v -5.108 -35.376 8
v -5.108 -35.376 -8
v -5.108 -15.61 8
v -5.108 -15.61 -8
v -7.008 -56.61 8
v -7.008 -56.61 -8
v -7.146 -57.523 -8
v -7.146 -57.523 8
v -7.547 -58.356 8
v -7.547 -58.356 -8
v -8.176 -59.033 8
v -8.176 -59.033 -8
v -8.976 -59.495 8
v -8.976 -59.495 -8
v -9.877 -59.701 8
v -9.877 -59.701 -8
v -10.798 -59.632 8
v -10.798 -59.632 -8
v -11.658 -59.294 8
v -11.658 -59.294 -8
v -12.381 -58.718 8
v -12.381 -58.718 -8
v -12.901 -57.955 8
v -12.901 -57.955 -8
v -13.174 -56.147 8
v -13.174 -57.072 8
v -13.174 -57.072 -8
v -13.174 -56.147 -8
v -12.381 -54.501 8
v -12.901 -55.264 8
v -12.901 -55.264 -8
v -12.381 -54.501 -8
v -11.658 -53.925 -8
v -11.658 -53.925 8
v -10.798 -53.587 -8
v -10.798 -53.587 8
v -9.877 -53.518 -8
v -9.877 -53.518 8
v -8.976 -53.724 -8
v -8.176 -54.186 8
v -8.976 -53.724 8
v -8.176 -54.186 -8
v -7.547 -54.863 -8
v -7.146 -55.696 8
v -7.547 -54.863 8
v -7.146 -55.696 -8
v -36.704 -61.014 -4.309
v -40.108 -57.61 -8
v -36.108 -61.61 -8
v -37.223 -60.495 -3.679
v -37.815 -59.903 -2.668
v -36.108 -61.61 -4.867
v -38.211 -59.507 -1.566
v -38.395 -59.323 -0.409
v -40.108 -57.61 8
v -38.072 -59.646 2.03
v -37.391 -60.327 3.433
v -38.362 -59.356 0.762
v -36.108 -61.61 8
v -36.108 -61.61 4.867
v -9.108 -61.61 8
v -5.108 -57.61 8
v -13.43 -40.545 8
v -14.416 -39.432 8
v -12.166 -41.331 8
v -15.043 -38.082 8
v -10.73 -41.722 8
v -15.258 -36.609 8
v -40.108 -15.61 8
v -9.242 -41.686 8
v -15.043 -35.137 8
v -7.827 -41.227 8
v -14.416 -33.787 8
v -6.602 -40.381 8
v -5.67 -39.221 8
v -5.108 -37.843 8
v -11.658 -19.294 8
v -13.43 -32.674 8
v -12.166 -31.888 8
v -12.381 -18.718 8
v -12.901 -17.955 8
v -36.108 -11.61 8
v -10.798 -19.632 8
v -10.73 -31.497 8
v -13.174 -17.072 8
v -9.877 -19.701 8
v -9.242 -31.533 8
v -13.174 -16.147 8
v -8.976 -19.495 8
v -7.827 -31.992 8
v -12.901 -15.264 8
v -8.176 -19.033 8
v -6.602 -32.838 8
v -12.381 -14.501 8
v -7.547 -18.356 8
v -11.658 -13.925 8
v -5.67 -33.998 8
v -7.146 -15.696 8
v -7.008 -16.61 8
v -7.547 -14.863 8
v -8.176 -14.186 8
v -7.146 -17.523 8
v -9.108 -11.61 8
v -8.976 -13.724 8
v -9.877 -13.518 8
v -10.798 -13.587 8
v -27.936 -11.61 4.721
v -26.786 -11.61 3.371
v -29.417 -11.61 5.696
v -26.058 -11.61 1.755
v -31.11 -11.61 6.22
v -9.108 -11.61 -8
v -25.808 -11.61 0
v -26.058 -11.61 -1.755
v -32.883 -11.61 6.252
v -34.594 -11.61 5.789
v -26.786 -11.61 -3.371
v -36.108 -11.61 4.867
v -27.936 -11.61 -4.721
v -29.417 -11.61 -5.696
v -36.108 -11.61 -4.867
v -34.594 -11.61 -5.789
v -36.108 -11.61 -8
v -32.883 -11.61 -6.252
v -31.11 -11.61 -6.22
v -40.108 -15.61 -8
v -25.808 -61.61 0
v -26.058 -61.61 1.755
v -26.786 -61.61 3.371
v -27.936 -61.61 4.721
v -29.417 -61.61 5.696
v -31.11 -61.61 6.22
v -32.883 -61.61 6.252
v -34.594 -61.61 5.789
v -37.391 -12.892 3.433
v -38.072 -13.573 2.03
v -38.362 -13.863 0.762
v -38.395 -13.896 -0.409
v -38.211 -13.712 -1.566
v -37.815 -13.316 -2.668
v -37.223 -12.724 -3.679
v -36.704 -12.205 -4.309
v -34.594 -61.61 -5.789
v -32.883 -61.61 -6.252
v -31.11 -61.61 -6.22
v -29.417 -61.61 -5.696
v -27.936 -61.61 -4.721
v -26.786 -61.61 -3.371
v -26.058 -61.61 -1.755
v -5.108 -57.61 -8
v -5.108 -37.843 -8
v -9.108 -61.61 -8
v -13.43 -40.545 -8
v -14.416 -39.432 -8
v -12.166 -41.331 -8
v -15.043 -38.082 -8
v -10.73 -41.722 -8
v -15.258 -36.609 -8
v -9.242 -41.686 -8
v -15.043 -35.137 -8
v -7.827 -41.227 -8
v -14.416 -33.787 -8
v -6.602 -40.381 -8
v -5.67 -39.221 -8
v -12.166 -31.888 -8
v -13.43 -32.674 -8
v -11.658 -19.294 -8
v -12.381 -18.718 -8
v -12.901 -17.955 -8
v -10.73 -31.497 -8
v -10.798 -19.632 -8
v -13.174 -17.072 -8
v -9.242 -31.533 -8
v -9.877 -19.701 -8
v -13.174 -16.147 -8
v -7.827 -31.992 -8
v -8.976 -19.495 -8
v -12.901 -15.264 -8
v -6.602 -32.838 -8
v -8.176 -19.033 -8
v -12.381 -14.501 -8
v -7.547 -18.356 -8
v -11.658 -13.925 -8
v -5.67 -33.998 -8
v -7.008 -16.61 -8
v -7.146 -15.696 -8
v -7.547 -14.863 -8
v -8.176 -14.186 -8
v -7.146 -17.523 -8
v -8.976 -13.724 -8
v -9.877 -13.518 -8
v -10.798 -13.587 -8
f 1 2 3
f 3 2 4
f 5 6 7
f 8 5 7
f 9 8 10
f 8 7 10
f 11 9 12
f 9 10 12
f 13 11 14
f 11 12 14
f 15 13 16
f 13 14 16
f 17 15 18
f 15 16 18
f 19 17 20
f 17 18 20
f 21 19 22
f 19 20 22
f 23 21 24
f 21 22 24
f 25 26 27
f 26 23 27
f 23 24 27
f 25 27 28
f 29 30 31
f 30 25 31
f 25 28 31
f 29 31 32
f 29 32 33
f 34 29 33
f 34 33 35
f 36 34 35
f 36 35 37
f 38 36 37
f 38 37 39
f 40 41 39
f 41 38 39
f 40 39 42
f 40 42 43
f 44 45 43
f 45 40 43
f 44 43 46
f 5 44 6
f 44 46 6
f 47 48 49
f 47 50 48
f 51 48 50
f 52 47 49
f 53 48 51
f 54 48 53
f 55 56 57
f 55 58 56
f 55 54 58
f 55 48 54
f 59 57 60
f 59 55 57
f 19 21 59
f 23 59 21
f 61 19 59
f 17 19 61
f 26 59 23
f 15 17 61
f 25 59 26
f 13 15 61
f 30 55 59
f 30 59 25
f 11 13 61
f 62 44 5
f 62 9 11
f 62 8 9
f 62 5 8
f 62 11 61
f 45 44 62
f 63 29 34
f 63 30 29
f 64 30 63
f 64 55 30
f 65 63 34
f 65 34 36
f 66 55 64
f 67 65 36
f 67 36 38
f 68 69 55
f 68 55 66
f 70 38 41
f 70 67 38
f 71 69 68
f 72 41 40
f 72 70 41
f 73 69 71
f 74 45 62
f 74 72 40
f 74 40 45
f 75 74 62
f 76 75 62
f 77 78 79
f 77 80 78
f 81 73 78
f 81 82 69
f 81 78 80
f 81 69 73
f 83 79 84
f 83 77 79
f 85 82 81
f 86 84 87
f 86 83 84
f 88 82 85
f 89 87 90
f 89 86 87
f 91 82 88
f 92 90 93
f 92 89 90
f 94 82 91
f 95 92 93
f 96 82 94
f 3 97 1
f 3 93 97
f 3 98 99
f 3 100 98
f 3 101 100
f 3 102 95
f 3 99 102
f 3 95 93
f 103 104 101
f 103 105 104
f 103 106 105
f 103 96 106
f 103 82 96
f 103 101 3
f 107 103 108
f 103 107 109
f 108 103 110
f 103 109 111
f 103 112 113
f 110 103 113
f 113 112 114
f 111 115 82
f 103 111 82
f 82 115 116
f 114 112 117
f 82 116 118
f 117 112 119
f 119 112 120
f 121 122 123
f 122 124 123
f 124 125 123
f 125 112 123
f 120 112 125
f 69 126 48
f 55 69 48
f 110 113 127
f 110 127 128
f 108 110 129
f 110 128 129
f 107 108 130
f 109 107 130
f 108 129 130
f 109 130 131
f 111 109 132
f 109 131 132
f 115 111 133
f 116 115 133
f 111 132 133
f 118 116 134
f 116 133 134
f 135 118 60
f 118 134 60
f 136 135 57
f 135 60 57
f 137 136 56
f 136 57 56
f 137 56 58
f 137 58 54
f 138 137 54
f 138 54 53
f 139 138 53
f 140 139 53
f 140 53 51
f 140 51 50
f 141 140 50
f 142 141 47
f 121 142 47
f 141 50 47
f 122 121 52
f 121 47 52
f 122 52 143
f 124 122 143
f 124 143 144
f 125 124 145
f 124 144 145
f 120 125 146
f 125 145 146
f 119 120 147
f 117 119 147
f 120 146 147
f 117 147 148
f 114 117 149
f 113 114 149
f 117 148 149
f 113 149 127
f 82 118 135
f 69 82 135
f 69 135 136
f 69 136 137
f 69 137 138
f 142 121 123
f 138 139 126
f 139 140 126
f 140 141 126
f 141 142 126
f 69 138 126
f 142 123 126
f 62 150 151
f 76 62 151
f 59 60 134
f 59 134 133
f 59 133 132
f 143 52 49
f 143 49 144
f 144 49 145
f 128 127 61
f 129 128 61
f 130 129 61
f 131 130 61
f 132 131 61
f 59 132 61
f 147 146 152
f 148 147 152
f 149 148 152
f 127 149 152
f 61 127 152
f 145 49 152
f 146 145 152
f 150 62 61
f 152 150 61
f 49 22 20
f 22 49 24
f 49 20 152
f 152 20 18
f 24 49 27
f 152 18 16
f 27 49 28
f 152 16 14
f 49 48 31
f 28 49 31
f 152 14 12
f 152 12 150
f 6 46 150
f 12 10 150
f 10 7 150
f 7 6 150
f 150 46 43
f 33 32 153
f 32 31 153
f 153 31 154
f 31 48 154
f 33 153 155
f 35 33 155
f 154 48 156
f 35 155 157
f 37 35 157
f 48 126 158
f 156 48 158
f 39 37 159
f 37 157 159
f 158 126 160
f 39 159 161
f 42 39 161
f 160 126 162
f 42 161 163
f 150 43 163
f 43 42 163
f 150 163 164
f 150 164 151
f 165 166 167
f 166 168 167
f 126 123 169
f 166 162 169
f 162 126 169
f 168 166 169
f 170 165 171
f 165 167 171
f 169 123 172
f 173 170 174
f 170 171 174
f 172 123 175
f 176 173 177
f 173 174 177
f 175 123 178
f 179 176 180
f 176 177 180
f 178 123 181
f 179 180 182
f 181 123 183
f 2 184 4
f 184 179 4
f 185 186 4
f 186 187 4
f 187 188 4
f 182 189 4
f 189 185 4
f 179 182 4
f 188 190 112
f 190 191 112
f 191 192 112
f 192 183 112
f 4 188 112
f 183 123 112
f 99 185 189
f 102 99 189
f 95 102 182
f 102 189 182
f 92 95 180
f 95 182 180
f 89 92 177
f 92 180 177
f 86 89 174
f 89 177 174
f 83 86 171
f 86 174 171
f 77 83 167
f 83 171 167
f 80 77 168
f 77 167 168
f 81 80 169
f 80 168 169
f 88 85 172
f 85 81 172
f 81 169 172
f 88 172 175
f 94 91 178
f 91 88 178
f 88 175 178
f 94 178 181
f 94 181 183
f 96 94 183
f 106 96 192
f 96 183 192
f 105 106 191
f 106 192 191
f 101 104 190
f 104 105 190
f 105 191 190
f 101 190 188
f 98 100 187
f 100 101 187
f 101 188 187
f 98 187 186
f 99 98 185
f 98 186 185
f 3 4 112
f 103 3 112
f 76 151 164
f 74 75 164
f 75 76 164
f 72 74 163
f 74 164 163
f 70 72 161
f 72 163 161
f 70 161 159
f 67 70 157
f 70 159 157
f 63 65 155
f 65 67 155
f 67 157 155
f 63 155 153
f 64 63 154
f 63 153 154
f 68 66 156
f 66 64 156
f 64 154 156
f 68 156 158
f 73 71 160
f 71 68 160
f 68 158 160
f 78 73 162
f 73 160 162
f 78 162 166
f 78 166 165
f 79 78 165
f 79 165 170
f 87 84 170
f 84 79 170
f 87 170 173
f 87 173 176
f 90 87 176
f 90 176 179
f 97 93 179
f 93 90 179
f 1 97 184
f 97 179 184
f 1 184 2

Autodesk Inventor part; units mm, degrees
ref_plane "YZ Plane" through (0, 0, 0) normal (1, 0, 0) x (0, 1, 0)
ref_plane "XZ Plane" through (0, 0, 0) normal (0, 1, 0) x (-1, 0, 0)
ref_plane "XY Plane" through (0, 0, 0) normal (0, 0, 1) x (1, 0, 0)
ref_plane "Work Plane1" through (0, 0, 0) normal (0, 0, 1) x (1, 0, 0)
sketch "Sketch1" plane through (0, 0, 0) normal (0, 0, 1) x (1, 0, 0)
  circle A0 centre (-10.1084, -16.6095) radius 3 construction
  circle A1 centre (-10.1084, -56.6095) radius 3 construction
  circle A2 centre (-10.1084, -36.6095) radius 5.15 projected
  line L0 (-29.1084, -220.5) -> (-29.1084, 29.5)
  line L1 (-35.1084, -220.5) -> (-35.1084, 29.5)
  line L2 (-40.1084, -61.6095) -> (-5.1084, -61.6095)
  line L3 (-5.1084, -61.6095) -> (-5.1084, -11.6095)
  line L4 (-5.1084, -11.6095) -> (-40.1084, -11.6095)
  line L5 (-40.1084, -11.6095) -> (-40.1084, -61.6095)
  line L6 (-40.1084, -61.6095) -> (-5.1084, -11.6095) construction
  line L7 (-5.1084, -61.6095) -> (-40.1084, -11.6095) construction
  circle A3 centre (-10.1084, -16.6095) radius 3.1
  circle A4 centre (-10.1084, -56.6095) radius 3.1
  point P0 (0, 0)
  point P1 (-22.6084, -36.6095)
  point P2 (-5.1084, -35.3756)
  point P3 (-5.1084, -37.8434)
  dimension "d0" = 35
  dimension "d1" = 50
  dimension "d2" = 5
  dimension "d3" = 6.2
  dimension "d4" = 6.2
extrude "Extrusion1" add sketch "Sketch1" along normal mid plane 16 contours A2 L3 L2 L0 L4 | L0 L2 L1 L4 | L1 L2 L5 L4
sketch "Sketch2" plane through (-40.1084, -61.6095, 8) normal (0, -1, 0) x (1, 0, 0)
  circle A0 centre (8, -8) radius 6 projected
  circle A1 centre (8, -8) radius 6.3
  point P0 (40.1084, -8)
  dimension "d7" = 0.3
extrude "Extrusion2" cut sketch "Sketch2" against normal through all contours A0 | A1
chamfer "Chamfer1" distance 4 angle 45 4 edges at (-5.1084, -61.6095, 0) (-5.1084, -11.6095, 0) (-40.1084, -61.6095, 0) (-40.1084, -11.6095, 0)
properties part number "06_OPENTRONS_Microscope_Extraslide_slide"
